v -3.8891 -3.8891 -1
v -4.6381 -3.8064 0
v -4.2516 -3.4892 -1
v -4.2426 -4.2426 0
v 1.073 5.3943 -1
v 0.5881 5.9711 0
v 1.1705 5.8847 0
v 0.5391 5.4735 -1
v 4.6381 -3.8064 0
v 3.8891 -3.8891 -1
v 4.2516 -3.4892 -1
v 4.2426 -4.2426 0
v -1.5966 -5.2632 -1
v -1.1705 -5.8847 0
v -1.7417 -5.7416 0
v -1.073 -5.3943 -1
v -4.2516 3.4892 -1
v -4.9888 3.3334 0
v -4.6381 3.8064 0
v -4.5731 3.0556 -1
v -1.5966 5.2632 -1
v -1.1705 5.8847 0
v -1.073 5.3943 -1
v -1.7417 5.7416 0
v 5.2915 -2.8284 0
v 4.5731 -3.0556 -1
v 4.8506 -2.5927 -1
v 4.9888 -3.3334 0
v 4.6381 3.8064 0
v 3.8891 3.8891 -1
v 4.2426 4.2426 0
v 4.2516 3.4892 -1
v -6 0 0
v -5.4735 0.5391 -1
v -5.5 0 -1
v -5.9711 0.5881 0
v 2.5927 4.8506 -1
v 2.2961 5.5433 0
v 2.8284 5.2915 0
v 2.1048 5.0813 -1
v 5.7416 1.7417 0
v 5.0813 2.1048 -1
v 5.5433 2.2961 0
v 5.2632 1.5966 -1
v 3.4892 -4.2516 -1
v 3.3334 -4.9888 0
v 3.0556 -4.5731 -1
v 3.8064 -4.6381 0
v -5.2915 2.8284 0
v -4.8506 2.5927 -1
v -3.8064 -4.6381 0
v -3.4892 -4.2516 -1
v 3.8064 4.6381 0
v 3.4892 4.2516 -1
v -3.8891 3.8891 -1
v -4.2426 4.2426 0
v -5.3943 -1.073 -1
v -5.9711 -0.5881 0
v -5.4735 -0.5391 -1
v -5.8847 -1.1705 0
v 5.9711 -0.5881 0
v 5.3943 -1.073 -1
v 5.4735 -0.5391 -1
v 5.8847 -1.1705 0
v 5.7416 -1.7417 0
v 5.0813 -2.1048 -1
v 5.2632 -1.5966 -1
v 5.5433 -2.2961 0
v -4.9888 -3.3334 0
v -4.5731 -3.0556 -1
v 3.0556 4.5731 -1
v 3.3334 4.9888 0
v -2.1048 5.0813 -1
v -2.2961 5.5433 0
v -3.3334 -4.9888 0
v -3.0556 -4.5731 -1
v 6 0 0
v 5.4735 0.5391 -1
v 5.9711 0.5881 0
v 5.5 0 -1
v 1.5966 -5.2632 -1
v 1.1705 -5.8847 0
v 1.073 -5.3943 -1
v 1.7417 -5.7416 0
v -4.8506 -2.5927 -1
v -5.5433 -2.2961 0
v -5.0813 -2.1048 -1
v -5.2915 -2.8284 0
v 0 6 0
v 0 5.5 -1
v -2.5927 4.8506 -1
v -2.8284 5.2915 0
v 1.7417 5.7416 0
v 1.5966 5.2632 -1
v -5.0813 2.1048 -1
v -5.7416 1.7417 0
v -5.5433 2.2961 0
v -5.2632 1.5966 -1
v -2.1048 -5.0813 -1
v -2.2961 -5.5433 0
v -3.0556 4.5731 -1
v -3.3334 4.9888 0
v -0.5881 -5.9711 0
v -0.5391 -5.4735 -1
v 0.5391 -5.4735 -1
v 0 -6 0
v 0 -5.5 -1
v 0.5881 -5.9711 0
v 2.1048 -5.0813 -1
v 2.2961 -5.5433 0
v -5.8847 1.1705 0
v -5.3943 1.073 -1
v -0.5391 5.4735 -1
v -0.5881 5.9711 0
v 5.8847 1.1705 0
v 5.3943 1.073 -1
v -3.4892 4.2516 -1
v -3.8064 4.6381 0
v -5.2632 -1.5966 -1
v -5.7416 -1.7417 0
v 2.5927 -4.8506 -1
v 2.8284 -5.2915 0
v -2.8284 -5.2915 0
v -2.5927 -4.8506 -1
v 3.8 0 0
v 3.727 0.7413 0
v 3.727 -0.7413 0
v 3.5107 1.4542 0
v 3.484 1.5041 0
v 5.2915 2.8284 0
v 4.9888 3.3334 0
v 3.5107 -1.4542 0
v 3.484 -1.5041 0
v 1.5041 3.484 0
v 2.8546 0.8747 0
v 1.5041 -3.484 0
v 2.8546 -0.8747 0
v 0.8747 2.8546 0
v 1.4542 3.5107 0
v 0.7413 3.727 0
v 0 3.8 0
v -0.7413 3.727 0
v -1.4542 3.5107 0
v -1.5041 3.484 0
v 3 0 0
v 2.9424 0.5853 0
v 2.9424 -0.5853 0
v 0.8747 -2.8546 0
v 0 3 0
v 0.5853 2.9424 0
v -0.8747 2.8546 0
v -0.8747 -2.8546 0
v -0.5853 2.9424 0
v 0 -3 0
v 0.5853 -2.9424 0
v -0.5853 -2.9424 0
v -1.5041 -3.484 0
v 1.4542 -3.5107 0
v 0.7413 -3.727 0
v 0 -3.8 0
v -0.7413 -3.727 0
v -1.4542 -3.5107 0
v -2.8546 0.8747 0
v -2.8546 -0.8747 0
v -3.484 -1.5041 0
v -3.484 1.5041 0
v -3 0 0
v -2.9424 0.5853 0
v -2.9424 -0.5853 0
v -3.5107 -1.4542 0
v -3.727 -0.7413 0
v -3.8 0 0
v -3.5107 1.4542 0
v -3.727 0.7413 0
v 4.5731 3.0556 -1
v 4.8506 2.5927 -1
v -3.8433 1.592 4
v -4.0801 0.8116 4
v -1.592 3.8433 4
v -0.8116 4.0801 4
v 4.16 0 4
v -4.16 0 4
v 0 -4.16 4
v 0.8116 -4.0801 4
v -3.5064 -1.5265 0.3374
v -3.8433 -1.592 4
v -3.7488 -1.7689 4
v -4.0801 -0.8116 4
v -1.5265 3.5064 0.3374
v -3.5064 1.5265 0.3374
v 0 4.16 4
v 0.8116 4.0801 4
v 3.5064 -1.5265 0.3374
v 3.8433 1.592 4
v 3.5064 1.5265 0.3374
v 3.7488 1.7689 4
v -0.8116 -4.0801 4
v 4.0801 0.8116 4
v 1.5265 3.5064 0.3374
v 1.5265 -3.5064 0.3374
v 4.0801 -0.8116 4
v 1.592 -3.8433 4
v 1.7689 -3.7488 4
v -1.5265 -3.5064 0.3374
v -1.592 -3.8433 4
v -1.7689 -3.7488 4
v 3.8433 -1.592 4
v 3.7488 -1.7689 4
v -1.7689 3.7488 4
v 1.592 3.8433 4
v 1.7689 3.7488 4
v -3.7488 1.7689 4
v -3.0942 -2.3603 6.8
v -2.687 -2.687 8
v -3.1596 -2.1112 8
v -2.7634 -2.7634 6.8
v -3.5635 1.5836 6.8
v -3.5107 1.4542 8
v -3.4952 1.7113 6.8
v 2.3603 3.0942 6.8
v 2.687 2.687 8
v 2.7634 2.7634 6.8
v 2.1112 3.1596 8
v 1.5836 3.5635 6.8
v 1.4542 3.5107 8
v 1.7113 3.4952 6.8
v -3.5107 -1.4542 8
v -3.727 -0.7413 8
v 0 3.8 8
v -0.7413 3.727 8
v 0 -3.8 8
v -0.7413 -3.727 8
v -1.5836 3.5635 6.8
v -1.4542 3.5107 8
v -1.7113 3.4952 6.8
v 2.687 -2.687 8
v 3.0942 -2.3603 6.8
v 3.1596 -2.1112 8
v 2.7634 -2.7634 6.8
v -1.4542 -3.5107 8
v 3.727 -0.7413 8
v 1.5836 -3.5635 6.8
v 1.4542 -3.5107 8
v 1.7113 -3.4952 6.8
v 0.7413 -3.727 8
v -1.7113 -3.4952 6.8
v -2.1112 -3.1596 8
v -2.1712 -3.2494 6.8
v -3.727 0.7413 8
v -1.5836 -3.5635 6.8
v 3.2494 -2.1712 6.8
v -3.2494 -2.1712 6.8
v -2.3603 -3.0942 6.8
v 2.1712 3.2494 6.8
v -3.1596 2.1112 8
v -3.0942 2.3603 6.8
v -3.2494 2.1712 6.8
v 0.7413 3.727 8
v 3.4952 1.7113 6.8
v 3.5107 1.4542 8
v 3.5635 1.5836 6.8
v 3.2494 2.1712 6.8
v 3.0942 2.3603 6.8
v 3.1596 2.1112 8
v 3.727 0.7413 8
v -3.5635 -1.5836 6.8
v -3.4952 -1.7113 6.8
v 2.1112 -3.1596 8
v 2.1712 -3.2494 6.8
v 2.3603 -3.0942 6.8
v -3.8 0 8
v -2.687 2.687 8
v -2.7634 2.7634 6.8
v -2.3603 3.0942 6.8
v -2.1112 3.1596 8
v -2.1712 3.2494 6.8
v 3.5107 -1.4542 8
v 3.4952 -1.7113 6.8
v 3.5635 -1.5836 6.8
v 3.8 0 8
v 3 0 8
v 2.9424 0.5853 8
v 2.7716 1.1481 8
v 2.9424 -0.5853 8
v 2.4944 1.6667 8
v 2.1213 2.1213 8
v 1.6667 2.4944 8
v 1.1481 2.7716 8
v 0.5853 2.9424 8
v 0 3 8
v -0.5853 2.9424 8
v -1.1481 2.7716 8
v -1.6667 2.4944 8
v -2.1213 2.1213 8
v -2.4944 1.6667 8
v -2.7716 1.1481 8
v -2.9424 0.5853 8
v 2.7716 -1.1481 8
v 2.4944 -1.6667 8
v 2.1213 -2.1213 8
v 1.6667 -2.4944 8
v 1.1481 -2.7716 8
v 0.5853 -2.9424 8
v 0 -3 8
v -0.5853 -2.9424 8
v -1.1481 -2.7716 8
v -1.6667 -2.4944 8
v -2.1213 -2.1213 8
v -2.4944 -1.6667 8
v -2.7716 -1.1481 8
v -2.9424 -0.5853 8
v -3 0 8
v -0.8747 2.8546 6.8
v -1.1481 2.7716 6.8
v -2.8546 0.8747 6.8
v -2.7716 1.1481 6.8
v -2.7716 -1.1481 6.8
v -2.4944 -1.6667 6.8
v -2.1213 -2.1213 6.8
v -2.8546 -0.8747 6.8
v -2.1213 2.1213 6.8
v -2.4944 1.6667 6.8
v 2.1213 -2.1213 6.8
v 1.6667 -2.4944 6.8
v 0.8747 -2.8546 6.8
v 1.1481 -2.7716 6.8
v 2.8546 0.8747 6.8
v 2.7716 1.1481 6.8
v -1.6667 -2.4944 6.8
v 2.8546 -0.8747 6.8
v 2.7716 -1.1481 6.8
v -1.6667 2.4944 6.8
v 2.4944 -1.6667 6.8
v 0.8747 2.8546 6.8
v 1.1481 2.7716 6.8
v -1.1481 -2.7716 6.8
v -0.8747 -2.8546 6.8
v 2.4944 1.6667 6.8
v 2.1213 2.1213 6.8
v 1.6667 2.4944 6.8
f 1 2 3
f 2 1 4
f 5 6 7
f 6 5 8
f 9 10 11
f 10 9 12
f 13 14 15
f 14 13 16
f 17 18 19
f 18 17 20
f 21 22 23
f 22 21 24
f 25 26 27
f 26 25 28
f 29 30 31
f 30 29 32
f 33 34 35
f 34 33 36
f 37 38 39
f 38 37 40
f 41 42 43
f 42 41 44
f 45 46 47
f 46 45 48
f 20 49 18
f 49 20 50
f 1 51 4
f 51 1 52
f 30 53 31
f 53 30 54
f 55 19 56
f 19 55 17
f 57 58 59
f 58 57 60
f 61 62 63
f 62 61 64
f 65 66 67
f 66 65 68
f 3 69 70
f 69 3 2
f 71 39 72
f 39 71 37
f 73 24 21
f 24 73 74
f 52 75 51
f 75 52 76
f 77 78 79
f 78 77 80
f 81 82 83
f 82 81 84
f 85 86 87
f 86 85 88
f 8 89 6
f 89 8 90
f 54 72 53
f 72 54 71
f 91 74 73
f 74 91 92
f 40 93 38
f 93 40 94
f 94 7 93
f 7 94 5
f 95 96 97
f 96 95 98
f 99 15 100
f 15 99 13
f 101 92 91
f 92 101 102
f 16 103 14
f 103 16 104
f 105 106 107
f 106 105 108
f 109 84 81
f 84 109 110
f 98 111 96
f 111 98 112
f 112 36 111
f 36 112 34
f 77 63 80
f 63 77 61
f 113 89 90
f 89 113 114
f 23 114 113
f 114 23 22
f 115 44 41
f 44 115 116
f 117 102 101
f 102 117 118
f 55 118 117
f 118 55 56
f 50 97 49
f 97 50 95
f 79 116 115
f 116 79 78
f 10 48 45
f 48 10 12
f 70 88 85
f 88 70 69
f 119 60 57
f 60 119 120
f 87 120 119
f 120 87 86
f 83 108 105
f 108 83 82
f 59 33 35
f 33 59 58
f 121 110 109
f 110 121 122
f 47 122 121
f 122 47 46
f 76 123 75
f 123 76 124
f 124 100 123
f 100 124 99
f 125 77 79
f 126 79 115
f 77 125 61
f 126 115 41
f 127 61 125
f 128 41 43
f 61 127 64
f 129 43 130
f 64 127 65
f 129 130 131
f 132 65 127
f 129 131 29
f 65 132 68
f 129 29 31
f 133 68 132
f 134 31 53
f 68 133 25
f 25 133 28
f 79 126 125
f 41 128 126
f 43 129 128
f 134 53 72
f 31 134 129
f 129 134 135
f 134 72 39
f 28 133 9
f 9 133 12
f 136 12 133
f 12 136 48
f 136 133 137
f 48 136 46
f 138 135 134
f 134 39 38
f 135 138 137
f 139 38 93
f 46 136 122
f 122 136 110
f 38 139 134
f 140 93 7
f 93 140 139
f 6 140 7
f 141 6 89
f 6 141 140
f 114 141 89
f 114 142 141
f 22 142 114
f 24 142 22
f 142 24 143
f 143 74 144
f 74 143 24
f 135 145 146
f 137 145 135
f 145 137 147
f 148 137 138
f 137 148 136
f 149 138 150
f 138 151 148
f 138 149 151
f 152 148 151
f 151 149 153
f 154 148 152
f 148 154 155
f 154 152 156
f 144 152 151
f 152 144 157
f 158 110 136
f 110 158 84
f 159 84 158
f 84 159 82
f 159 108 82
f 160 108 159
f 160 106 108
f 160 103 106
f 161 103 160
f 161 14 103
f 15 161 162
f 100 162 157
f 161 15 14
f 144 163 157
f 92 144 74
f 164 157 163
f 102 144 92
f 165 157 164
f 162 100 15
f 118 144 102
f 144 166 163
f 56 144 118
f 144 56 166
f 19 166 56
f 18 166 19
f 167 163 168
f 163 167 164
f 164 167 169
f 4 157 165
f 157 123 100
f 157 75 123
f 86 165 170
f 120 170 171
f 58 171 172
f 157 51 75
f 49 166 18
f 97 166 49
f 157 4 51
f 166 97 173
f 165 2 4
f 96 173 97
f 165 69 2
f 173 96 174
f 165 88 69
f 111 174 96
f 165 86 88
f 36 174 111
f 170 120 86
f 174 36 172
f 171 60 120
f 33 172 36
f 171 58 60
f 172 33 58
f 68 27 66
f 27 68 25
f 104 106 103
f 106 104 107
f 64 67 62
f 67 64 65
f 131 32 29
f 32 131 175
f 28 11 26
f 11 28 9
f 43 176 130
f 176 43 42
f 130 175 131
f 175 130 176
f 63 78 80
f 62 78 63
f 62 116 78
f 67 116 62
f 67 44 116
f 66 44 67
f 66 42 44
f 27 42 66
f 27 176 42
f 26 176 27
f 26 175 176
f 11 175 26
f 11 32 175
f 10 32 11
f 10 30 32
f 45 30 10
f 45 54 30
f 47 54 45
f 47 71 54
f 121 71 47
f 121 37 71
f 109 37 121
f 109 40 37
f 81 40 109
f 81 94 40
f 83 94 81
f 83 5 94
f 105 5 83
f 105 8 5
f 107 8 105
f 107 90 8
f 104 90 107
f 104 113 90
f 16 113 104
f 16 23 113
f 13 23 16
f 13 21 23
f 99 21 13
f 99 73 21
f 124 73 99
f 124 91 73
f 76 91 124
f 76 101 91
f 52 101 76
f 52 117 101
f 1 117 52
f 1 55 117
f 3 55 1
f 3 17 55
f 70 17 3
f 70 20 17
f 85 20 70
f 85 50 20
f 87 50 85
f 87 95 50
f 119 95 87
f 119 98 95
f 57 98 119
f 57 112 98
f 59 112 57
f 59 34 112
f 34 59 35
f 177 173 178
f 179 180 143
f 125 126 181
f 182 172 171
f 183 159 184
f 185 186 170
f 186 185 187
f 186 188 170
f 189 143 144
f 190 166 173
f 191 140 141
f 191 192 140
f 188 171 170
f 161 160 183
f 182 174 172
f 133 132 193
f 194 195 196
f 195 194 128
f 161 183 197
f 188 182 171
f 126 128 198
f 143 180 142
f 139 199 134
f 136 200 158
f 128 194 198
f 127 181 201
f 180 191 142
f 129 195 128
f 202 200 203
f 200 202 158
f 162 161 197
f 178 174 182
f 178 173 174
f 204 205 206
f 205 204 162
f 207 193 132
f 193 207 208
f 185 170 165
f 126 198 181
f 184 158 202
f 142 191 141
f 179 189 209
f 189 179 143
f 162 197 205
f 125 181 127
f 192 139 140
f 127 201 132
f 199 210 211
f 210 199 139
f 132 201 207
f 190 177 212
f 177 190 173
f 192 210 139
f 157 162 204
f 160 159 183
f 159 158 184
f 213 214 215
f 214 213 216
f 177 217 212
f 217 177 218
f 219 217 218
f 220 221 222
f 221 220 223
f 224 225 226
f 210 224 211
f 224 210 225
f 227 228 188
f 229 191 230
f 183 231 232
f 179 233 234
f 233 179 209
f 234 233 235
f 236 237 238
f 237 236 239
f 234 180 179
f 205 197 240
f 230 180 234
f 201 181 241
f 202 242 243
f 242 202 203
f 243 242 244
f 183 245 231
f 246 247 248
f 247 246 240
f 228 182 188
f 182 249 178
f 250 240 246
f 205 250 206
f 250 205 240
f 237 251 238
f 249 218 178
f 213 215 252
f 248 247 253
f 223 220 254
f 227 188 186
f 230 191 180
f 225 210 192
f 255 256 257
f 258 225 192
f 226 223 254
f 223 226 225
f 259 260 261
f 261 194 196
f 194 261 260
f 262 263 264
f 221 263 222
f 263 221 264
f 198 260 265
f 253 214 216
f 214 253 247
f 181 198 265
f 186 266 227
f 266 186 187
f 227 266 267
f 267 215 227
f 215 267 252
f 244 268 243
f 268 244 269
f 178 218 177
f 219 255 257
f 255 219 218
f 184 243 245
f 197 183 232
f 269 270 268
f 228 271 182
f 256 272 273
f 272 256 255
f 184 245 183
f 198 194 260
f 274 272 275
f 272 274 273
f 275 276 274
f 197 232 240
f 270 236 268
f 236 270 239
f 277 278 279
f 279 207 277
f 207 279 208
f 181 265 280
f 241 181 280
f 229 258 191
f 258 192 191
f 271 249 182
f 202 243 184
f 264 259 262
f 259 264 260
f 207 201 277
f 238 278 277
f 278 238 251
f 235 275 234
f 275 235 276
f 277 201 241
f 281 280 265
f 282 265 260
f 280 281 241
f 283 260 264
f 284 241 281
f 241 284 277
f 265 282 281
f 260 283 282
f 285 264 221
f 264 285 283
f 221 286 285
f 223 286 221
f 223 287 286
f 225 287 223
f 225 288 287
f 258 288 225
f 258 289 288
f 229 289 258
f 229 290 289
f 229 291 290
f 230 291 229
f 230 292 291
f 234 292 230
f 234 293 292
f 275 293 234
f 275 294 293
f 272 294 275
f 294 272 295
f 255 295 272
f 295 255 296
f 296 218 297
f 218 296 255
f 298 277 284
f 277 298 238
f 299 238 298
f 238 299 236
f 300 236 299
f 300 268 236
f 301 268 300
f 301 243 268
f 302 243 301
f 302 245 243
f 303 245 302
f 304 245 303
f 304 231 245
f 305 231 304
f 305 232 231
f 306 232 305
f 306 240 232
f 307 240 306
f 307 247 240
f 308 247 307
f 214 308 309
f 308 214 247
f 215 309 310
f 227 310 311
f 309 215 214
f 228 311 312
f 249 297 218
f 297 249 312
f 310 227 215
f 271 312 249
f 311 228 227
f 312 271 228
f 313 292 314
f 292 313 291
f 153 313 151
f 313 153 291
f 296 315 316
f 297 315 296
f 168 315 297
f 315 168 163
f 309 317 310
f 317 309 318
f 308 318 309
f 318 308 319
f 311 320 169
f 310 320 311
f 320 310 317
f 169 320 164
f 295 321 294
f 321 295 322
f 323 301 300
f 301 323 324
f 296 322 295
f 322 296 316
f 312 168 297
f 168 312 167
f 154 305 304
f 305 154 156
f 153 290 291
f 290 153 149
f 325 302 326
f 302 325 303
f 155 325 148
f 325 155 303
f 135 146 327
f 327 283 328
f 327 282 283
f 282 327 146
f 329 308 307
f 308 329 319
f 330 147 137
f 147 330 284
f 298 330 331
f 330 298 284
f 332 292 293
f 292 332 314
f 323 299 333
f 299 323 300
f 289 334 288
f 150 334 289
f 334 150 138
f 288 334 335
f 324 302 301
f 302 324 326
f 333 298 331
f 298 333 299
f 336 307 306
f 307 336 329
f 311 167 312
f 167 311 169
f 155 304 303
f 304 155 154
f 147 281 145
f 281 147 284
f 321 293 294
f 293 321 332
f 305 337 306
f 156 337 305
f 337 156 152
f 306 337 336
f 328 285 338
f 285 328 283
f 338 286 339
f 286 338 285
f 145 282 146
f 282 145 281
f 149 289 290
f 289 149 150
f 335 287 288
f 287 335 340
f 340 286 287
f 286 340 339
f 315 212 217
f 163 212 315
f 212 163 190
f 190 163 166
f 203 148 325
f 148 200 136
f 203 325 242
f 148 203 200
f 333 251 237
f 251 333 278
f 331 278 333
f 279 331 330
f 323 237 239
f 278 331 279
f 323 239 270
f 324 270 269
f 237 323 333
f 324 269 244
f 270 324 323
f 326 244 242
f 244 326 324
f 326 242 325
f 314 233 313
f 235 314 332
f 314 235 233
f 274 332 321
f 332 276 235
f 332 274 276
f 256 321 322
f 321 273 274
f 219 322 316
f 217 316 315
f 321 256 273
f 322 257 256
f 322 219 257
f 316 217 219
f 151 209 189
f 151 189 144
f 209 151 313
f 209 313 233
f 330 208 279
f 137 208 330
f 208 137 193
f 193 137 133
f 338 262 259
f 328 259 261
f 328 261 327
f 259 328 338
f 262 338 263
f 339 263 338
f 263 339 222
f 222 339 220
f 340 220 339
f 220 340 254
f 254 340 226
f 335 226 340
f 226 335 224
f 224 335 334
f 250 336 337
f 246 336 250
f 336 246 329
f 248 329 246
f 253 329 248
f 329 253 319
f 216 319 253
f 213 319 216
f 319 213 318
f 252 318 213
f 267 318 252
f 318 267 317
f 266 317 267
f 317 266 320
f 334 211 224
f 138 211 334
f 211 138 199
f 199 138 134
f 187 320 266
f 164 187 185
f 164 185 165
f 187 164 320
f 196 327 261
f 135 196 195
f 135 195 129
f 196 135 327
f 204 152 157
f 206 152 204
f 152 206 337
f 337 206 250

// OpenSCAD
//By Coat, 26-aug-2018
//Licensed under the Creative Commons - Attribution license.
//Cover cap for unwanted holes in cabinets, bookshelfs etc.
//cleaned up secondary parameters a little at 28-aug-2018, same functionality
//Update 29-aug-2018: plug got loose of the cap with higher diameters (> 30 mm) problem solved 


//Primary parameters
//Diameter of the plug or hole
diamplug = 8;
//Length of the plug (little less then the depth of the hole)
lengthplug = 8;
//Diameter of the cap
diamcap = 12;
//Thickness of the cap
capthick = 1;
//Do you want a round (1) or a square cap (0)
roundsquare = 1;

//The Parts
//****************************************
module cap(rr, dd)
{
  $fn=rr;
  difference()                 //cone minus cylinder gives the cap with chamfer 
  {                            //dd (diamcap) is also the height of the cone
    cylinder(h=dd, d1=dd, d2=0);   
    translate([0, 0, capthick])
      cylinder (h=dd, d=dd);
  }
}

//****************************************
module plug()
{
  //secondary parameters
  $fn = 32;
  hp = lengthplug/2;      //height of the two main parts body
  np = 0.95*diamplug;     //narrowest contour
  wp = min(1.04*diamplug, diamplug + 1); //widest contour, larger factor > tighter fit, limited to +1mm
  wwp = 0.8;              //width wall plug
  wg = 0.35*diamplug;      //width of grooves in plug, smaller > harder to get in/out
  hg = 2*hp*0.85;         //height grooves
  
  difference()
  {
    //body
    union()
    {  
      translate([0, 0, -hp]) 
        cylinder(h=hp, d1=wp, d2=np);
      translate([0, 0, -2*hp]) 
        cylinder(h=hp, d1=np, d2=wp);
    }
    //centerhole
    translate([0, 0, -3*hp])    //3 iso 2 is easier to see in openscad
      cylinder(h=3*hp, d=np-wwp*2);    
    //grooves
    translate([-0.5*wg, -diamplug, -hg])
      cube([wg, diamplug*2, hg]);
    translate([-diamplug, -0.5*wg, -hg])
      cube([diamplug*2, wg, hg]);
  }
}
//****************************************

//Main, the thing
rotate([0, 180, 45])
  union()
  {
    if (roundsquare) cap(64, diamcap); else cap(4, diamcap*sqrt(2));
    plug();
  }
